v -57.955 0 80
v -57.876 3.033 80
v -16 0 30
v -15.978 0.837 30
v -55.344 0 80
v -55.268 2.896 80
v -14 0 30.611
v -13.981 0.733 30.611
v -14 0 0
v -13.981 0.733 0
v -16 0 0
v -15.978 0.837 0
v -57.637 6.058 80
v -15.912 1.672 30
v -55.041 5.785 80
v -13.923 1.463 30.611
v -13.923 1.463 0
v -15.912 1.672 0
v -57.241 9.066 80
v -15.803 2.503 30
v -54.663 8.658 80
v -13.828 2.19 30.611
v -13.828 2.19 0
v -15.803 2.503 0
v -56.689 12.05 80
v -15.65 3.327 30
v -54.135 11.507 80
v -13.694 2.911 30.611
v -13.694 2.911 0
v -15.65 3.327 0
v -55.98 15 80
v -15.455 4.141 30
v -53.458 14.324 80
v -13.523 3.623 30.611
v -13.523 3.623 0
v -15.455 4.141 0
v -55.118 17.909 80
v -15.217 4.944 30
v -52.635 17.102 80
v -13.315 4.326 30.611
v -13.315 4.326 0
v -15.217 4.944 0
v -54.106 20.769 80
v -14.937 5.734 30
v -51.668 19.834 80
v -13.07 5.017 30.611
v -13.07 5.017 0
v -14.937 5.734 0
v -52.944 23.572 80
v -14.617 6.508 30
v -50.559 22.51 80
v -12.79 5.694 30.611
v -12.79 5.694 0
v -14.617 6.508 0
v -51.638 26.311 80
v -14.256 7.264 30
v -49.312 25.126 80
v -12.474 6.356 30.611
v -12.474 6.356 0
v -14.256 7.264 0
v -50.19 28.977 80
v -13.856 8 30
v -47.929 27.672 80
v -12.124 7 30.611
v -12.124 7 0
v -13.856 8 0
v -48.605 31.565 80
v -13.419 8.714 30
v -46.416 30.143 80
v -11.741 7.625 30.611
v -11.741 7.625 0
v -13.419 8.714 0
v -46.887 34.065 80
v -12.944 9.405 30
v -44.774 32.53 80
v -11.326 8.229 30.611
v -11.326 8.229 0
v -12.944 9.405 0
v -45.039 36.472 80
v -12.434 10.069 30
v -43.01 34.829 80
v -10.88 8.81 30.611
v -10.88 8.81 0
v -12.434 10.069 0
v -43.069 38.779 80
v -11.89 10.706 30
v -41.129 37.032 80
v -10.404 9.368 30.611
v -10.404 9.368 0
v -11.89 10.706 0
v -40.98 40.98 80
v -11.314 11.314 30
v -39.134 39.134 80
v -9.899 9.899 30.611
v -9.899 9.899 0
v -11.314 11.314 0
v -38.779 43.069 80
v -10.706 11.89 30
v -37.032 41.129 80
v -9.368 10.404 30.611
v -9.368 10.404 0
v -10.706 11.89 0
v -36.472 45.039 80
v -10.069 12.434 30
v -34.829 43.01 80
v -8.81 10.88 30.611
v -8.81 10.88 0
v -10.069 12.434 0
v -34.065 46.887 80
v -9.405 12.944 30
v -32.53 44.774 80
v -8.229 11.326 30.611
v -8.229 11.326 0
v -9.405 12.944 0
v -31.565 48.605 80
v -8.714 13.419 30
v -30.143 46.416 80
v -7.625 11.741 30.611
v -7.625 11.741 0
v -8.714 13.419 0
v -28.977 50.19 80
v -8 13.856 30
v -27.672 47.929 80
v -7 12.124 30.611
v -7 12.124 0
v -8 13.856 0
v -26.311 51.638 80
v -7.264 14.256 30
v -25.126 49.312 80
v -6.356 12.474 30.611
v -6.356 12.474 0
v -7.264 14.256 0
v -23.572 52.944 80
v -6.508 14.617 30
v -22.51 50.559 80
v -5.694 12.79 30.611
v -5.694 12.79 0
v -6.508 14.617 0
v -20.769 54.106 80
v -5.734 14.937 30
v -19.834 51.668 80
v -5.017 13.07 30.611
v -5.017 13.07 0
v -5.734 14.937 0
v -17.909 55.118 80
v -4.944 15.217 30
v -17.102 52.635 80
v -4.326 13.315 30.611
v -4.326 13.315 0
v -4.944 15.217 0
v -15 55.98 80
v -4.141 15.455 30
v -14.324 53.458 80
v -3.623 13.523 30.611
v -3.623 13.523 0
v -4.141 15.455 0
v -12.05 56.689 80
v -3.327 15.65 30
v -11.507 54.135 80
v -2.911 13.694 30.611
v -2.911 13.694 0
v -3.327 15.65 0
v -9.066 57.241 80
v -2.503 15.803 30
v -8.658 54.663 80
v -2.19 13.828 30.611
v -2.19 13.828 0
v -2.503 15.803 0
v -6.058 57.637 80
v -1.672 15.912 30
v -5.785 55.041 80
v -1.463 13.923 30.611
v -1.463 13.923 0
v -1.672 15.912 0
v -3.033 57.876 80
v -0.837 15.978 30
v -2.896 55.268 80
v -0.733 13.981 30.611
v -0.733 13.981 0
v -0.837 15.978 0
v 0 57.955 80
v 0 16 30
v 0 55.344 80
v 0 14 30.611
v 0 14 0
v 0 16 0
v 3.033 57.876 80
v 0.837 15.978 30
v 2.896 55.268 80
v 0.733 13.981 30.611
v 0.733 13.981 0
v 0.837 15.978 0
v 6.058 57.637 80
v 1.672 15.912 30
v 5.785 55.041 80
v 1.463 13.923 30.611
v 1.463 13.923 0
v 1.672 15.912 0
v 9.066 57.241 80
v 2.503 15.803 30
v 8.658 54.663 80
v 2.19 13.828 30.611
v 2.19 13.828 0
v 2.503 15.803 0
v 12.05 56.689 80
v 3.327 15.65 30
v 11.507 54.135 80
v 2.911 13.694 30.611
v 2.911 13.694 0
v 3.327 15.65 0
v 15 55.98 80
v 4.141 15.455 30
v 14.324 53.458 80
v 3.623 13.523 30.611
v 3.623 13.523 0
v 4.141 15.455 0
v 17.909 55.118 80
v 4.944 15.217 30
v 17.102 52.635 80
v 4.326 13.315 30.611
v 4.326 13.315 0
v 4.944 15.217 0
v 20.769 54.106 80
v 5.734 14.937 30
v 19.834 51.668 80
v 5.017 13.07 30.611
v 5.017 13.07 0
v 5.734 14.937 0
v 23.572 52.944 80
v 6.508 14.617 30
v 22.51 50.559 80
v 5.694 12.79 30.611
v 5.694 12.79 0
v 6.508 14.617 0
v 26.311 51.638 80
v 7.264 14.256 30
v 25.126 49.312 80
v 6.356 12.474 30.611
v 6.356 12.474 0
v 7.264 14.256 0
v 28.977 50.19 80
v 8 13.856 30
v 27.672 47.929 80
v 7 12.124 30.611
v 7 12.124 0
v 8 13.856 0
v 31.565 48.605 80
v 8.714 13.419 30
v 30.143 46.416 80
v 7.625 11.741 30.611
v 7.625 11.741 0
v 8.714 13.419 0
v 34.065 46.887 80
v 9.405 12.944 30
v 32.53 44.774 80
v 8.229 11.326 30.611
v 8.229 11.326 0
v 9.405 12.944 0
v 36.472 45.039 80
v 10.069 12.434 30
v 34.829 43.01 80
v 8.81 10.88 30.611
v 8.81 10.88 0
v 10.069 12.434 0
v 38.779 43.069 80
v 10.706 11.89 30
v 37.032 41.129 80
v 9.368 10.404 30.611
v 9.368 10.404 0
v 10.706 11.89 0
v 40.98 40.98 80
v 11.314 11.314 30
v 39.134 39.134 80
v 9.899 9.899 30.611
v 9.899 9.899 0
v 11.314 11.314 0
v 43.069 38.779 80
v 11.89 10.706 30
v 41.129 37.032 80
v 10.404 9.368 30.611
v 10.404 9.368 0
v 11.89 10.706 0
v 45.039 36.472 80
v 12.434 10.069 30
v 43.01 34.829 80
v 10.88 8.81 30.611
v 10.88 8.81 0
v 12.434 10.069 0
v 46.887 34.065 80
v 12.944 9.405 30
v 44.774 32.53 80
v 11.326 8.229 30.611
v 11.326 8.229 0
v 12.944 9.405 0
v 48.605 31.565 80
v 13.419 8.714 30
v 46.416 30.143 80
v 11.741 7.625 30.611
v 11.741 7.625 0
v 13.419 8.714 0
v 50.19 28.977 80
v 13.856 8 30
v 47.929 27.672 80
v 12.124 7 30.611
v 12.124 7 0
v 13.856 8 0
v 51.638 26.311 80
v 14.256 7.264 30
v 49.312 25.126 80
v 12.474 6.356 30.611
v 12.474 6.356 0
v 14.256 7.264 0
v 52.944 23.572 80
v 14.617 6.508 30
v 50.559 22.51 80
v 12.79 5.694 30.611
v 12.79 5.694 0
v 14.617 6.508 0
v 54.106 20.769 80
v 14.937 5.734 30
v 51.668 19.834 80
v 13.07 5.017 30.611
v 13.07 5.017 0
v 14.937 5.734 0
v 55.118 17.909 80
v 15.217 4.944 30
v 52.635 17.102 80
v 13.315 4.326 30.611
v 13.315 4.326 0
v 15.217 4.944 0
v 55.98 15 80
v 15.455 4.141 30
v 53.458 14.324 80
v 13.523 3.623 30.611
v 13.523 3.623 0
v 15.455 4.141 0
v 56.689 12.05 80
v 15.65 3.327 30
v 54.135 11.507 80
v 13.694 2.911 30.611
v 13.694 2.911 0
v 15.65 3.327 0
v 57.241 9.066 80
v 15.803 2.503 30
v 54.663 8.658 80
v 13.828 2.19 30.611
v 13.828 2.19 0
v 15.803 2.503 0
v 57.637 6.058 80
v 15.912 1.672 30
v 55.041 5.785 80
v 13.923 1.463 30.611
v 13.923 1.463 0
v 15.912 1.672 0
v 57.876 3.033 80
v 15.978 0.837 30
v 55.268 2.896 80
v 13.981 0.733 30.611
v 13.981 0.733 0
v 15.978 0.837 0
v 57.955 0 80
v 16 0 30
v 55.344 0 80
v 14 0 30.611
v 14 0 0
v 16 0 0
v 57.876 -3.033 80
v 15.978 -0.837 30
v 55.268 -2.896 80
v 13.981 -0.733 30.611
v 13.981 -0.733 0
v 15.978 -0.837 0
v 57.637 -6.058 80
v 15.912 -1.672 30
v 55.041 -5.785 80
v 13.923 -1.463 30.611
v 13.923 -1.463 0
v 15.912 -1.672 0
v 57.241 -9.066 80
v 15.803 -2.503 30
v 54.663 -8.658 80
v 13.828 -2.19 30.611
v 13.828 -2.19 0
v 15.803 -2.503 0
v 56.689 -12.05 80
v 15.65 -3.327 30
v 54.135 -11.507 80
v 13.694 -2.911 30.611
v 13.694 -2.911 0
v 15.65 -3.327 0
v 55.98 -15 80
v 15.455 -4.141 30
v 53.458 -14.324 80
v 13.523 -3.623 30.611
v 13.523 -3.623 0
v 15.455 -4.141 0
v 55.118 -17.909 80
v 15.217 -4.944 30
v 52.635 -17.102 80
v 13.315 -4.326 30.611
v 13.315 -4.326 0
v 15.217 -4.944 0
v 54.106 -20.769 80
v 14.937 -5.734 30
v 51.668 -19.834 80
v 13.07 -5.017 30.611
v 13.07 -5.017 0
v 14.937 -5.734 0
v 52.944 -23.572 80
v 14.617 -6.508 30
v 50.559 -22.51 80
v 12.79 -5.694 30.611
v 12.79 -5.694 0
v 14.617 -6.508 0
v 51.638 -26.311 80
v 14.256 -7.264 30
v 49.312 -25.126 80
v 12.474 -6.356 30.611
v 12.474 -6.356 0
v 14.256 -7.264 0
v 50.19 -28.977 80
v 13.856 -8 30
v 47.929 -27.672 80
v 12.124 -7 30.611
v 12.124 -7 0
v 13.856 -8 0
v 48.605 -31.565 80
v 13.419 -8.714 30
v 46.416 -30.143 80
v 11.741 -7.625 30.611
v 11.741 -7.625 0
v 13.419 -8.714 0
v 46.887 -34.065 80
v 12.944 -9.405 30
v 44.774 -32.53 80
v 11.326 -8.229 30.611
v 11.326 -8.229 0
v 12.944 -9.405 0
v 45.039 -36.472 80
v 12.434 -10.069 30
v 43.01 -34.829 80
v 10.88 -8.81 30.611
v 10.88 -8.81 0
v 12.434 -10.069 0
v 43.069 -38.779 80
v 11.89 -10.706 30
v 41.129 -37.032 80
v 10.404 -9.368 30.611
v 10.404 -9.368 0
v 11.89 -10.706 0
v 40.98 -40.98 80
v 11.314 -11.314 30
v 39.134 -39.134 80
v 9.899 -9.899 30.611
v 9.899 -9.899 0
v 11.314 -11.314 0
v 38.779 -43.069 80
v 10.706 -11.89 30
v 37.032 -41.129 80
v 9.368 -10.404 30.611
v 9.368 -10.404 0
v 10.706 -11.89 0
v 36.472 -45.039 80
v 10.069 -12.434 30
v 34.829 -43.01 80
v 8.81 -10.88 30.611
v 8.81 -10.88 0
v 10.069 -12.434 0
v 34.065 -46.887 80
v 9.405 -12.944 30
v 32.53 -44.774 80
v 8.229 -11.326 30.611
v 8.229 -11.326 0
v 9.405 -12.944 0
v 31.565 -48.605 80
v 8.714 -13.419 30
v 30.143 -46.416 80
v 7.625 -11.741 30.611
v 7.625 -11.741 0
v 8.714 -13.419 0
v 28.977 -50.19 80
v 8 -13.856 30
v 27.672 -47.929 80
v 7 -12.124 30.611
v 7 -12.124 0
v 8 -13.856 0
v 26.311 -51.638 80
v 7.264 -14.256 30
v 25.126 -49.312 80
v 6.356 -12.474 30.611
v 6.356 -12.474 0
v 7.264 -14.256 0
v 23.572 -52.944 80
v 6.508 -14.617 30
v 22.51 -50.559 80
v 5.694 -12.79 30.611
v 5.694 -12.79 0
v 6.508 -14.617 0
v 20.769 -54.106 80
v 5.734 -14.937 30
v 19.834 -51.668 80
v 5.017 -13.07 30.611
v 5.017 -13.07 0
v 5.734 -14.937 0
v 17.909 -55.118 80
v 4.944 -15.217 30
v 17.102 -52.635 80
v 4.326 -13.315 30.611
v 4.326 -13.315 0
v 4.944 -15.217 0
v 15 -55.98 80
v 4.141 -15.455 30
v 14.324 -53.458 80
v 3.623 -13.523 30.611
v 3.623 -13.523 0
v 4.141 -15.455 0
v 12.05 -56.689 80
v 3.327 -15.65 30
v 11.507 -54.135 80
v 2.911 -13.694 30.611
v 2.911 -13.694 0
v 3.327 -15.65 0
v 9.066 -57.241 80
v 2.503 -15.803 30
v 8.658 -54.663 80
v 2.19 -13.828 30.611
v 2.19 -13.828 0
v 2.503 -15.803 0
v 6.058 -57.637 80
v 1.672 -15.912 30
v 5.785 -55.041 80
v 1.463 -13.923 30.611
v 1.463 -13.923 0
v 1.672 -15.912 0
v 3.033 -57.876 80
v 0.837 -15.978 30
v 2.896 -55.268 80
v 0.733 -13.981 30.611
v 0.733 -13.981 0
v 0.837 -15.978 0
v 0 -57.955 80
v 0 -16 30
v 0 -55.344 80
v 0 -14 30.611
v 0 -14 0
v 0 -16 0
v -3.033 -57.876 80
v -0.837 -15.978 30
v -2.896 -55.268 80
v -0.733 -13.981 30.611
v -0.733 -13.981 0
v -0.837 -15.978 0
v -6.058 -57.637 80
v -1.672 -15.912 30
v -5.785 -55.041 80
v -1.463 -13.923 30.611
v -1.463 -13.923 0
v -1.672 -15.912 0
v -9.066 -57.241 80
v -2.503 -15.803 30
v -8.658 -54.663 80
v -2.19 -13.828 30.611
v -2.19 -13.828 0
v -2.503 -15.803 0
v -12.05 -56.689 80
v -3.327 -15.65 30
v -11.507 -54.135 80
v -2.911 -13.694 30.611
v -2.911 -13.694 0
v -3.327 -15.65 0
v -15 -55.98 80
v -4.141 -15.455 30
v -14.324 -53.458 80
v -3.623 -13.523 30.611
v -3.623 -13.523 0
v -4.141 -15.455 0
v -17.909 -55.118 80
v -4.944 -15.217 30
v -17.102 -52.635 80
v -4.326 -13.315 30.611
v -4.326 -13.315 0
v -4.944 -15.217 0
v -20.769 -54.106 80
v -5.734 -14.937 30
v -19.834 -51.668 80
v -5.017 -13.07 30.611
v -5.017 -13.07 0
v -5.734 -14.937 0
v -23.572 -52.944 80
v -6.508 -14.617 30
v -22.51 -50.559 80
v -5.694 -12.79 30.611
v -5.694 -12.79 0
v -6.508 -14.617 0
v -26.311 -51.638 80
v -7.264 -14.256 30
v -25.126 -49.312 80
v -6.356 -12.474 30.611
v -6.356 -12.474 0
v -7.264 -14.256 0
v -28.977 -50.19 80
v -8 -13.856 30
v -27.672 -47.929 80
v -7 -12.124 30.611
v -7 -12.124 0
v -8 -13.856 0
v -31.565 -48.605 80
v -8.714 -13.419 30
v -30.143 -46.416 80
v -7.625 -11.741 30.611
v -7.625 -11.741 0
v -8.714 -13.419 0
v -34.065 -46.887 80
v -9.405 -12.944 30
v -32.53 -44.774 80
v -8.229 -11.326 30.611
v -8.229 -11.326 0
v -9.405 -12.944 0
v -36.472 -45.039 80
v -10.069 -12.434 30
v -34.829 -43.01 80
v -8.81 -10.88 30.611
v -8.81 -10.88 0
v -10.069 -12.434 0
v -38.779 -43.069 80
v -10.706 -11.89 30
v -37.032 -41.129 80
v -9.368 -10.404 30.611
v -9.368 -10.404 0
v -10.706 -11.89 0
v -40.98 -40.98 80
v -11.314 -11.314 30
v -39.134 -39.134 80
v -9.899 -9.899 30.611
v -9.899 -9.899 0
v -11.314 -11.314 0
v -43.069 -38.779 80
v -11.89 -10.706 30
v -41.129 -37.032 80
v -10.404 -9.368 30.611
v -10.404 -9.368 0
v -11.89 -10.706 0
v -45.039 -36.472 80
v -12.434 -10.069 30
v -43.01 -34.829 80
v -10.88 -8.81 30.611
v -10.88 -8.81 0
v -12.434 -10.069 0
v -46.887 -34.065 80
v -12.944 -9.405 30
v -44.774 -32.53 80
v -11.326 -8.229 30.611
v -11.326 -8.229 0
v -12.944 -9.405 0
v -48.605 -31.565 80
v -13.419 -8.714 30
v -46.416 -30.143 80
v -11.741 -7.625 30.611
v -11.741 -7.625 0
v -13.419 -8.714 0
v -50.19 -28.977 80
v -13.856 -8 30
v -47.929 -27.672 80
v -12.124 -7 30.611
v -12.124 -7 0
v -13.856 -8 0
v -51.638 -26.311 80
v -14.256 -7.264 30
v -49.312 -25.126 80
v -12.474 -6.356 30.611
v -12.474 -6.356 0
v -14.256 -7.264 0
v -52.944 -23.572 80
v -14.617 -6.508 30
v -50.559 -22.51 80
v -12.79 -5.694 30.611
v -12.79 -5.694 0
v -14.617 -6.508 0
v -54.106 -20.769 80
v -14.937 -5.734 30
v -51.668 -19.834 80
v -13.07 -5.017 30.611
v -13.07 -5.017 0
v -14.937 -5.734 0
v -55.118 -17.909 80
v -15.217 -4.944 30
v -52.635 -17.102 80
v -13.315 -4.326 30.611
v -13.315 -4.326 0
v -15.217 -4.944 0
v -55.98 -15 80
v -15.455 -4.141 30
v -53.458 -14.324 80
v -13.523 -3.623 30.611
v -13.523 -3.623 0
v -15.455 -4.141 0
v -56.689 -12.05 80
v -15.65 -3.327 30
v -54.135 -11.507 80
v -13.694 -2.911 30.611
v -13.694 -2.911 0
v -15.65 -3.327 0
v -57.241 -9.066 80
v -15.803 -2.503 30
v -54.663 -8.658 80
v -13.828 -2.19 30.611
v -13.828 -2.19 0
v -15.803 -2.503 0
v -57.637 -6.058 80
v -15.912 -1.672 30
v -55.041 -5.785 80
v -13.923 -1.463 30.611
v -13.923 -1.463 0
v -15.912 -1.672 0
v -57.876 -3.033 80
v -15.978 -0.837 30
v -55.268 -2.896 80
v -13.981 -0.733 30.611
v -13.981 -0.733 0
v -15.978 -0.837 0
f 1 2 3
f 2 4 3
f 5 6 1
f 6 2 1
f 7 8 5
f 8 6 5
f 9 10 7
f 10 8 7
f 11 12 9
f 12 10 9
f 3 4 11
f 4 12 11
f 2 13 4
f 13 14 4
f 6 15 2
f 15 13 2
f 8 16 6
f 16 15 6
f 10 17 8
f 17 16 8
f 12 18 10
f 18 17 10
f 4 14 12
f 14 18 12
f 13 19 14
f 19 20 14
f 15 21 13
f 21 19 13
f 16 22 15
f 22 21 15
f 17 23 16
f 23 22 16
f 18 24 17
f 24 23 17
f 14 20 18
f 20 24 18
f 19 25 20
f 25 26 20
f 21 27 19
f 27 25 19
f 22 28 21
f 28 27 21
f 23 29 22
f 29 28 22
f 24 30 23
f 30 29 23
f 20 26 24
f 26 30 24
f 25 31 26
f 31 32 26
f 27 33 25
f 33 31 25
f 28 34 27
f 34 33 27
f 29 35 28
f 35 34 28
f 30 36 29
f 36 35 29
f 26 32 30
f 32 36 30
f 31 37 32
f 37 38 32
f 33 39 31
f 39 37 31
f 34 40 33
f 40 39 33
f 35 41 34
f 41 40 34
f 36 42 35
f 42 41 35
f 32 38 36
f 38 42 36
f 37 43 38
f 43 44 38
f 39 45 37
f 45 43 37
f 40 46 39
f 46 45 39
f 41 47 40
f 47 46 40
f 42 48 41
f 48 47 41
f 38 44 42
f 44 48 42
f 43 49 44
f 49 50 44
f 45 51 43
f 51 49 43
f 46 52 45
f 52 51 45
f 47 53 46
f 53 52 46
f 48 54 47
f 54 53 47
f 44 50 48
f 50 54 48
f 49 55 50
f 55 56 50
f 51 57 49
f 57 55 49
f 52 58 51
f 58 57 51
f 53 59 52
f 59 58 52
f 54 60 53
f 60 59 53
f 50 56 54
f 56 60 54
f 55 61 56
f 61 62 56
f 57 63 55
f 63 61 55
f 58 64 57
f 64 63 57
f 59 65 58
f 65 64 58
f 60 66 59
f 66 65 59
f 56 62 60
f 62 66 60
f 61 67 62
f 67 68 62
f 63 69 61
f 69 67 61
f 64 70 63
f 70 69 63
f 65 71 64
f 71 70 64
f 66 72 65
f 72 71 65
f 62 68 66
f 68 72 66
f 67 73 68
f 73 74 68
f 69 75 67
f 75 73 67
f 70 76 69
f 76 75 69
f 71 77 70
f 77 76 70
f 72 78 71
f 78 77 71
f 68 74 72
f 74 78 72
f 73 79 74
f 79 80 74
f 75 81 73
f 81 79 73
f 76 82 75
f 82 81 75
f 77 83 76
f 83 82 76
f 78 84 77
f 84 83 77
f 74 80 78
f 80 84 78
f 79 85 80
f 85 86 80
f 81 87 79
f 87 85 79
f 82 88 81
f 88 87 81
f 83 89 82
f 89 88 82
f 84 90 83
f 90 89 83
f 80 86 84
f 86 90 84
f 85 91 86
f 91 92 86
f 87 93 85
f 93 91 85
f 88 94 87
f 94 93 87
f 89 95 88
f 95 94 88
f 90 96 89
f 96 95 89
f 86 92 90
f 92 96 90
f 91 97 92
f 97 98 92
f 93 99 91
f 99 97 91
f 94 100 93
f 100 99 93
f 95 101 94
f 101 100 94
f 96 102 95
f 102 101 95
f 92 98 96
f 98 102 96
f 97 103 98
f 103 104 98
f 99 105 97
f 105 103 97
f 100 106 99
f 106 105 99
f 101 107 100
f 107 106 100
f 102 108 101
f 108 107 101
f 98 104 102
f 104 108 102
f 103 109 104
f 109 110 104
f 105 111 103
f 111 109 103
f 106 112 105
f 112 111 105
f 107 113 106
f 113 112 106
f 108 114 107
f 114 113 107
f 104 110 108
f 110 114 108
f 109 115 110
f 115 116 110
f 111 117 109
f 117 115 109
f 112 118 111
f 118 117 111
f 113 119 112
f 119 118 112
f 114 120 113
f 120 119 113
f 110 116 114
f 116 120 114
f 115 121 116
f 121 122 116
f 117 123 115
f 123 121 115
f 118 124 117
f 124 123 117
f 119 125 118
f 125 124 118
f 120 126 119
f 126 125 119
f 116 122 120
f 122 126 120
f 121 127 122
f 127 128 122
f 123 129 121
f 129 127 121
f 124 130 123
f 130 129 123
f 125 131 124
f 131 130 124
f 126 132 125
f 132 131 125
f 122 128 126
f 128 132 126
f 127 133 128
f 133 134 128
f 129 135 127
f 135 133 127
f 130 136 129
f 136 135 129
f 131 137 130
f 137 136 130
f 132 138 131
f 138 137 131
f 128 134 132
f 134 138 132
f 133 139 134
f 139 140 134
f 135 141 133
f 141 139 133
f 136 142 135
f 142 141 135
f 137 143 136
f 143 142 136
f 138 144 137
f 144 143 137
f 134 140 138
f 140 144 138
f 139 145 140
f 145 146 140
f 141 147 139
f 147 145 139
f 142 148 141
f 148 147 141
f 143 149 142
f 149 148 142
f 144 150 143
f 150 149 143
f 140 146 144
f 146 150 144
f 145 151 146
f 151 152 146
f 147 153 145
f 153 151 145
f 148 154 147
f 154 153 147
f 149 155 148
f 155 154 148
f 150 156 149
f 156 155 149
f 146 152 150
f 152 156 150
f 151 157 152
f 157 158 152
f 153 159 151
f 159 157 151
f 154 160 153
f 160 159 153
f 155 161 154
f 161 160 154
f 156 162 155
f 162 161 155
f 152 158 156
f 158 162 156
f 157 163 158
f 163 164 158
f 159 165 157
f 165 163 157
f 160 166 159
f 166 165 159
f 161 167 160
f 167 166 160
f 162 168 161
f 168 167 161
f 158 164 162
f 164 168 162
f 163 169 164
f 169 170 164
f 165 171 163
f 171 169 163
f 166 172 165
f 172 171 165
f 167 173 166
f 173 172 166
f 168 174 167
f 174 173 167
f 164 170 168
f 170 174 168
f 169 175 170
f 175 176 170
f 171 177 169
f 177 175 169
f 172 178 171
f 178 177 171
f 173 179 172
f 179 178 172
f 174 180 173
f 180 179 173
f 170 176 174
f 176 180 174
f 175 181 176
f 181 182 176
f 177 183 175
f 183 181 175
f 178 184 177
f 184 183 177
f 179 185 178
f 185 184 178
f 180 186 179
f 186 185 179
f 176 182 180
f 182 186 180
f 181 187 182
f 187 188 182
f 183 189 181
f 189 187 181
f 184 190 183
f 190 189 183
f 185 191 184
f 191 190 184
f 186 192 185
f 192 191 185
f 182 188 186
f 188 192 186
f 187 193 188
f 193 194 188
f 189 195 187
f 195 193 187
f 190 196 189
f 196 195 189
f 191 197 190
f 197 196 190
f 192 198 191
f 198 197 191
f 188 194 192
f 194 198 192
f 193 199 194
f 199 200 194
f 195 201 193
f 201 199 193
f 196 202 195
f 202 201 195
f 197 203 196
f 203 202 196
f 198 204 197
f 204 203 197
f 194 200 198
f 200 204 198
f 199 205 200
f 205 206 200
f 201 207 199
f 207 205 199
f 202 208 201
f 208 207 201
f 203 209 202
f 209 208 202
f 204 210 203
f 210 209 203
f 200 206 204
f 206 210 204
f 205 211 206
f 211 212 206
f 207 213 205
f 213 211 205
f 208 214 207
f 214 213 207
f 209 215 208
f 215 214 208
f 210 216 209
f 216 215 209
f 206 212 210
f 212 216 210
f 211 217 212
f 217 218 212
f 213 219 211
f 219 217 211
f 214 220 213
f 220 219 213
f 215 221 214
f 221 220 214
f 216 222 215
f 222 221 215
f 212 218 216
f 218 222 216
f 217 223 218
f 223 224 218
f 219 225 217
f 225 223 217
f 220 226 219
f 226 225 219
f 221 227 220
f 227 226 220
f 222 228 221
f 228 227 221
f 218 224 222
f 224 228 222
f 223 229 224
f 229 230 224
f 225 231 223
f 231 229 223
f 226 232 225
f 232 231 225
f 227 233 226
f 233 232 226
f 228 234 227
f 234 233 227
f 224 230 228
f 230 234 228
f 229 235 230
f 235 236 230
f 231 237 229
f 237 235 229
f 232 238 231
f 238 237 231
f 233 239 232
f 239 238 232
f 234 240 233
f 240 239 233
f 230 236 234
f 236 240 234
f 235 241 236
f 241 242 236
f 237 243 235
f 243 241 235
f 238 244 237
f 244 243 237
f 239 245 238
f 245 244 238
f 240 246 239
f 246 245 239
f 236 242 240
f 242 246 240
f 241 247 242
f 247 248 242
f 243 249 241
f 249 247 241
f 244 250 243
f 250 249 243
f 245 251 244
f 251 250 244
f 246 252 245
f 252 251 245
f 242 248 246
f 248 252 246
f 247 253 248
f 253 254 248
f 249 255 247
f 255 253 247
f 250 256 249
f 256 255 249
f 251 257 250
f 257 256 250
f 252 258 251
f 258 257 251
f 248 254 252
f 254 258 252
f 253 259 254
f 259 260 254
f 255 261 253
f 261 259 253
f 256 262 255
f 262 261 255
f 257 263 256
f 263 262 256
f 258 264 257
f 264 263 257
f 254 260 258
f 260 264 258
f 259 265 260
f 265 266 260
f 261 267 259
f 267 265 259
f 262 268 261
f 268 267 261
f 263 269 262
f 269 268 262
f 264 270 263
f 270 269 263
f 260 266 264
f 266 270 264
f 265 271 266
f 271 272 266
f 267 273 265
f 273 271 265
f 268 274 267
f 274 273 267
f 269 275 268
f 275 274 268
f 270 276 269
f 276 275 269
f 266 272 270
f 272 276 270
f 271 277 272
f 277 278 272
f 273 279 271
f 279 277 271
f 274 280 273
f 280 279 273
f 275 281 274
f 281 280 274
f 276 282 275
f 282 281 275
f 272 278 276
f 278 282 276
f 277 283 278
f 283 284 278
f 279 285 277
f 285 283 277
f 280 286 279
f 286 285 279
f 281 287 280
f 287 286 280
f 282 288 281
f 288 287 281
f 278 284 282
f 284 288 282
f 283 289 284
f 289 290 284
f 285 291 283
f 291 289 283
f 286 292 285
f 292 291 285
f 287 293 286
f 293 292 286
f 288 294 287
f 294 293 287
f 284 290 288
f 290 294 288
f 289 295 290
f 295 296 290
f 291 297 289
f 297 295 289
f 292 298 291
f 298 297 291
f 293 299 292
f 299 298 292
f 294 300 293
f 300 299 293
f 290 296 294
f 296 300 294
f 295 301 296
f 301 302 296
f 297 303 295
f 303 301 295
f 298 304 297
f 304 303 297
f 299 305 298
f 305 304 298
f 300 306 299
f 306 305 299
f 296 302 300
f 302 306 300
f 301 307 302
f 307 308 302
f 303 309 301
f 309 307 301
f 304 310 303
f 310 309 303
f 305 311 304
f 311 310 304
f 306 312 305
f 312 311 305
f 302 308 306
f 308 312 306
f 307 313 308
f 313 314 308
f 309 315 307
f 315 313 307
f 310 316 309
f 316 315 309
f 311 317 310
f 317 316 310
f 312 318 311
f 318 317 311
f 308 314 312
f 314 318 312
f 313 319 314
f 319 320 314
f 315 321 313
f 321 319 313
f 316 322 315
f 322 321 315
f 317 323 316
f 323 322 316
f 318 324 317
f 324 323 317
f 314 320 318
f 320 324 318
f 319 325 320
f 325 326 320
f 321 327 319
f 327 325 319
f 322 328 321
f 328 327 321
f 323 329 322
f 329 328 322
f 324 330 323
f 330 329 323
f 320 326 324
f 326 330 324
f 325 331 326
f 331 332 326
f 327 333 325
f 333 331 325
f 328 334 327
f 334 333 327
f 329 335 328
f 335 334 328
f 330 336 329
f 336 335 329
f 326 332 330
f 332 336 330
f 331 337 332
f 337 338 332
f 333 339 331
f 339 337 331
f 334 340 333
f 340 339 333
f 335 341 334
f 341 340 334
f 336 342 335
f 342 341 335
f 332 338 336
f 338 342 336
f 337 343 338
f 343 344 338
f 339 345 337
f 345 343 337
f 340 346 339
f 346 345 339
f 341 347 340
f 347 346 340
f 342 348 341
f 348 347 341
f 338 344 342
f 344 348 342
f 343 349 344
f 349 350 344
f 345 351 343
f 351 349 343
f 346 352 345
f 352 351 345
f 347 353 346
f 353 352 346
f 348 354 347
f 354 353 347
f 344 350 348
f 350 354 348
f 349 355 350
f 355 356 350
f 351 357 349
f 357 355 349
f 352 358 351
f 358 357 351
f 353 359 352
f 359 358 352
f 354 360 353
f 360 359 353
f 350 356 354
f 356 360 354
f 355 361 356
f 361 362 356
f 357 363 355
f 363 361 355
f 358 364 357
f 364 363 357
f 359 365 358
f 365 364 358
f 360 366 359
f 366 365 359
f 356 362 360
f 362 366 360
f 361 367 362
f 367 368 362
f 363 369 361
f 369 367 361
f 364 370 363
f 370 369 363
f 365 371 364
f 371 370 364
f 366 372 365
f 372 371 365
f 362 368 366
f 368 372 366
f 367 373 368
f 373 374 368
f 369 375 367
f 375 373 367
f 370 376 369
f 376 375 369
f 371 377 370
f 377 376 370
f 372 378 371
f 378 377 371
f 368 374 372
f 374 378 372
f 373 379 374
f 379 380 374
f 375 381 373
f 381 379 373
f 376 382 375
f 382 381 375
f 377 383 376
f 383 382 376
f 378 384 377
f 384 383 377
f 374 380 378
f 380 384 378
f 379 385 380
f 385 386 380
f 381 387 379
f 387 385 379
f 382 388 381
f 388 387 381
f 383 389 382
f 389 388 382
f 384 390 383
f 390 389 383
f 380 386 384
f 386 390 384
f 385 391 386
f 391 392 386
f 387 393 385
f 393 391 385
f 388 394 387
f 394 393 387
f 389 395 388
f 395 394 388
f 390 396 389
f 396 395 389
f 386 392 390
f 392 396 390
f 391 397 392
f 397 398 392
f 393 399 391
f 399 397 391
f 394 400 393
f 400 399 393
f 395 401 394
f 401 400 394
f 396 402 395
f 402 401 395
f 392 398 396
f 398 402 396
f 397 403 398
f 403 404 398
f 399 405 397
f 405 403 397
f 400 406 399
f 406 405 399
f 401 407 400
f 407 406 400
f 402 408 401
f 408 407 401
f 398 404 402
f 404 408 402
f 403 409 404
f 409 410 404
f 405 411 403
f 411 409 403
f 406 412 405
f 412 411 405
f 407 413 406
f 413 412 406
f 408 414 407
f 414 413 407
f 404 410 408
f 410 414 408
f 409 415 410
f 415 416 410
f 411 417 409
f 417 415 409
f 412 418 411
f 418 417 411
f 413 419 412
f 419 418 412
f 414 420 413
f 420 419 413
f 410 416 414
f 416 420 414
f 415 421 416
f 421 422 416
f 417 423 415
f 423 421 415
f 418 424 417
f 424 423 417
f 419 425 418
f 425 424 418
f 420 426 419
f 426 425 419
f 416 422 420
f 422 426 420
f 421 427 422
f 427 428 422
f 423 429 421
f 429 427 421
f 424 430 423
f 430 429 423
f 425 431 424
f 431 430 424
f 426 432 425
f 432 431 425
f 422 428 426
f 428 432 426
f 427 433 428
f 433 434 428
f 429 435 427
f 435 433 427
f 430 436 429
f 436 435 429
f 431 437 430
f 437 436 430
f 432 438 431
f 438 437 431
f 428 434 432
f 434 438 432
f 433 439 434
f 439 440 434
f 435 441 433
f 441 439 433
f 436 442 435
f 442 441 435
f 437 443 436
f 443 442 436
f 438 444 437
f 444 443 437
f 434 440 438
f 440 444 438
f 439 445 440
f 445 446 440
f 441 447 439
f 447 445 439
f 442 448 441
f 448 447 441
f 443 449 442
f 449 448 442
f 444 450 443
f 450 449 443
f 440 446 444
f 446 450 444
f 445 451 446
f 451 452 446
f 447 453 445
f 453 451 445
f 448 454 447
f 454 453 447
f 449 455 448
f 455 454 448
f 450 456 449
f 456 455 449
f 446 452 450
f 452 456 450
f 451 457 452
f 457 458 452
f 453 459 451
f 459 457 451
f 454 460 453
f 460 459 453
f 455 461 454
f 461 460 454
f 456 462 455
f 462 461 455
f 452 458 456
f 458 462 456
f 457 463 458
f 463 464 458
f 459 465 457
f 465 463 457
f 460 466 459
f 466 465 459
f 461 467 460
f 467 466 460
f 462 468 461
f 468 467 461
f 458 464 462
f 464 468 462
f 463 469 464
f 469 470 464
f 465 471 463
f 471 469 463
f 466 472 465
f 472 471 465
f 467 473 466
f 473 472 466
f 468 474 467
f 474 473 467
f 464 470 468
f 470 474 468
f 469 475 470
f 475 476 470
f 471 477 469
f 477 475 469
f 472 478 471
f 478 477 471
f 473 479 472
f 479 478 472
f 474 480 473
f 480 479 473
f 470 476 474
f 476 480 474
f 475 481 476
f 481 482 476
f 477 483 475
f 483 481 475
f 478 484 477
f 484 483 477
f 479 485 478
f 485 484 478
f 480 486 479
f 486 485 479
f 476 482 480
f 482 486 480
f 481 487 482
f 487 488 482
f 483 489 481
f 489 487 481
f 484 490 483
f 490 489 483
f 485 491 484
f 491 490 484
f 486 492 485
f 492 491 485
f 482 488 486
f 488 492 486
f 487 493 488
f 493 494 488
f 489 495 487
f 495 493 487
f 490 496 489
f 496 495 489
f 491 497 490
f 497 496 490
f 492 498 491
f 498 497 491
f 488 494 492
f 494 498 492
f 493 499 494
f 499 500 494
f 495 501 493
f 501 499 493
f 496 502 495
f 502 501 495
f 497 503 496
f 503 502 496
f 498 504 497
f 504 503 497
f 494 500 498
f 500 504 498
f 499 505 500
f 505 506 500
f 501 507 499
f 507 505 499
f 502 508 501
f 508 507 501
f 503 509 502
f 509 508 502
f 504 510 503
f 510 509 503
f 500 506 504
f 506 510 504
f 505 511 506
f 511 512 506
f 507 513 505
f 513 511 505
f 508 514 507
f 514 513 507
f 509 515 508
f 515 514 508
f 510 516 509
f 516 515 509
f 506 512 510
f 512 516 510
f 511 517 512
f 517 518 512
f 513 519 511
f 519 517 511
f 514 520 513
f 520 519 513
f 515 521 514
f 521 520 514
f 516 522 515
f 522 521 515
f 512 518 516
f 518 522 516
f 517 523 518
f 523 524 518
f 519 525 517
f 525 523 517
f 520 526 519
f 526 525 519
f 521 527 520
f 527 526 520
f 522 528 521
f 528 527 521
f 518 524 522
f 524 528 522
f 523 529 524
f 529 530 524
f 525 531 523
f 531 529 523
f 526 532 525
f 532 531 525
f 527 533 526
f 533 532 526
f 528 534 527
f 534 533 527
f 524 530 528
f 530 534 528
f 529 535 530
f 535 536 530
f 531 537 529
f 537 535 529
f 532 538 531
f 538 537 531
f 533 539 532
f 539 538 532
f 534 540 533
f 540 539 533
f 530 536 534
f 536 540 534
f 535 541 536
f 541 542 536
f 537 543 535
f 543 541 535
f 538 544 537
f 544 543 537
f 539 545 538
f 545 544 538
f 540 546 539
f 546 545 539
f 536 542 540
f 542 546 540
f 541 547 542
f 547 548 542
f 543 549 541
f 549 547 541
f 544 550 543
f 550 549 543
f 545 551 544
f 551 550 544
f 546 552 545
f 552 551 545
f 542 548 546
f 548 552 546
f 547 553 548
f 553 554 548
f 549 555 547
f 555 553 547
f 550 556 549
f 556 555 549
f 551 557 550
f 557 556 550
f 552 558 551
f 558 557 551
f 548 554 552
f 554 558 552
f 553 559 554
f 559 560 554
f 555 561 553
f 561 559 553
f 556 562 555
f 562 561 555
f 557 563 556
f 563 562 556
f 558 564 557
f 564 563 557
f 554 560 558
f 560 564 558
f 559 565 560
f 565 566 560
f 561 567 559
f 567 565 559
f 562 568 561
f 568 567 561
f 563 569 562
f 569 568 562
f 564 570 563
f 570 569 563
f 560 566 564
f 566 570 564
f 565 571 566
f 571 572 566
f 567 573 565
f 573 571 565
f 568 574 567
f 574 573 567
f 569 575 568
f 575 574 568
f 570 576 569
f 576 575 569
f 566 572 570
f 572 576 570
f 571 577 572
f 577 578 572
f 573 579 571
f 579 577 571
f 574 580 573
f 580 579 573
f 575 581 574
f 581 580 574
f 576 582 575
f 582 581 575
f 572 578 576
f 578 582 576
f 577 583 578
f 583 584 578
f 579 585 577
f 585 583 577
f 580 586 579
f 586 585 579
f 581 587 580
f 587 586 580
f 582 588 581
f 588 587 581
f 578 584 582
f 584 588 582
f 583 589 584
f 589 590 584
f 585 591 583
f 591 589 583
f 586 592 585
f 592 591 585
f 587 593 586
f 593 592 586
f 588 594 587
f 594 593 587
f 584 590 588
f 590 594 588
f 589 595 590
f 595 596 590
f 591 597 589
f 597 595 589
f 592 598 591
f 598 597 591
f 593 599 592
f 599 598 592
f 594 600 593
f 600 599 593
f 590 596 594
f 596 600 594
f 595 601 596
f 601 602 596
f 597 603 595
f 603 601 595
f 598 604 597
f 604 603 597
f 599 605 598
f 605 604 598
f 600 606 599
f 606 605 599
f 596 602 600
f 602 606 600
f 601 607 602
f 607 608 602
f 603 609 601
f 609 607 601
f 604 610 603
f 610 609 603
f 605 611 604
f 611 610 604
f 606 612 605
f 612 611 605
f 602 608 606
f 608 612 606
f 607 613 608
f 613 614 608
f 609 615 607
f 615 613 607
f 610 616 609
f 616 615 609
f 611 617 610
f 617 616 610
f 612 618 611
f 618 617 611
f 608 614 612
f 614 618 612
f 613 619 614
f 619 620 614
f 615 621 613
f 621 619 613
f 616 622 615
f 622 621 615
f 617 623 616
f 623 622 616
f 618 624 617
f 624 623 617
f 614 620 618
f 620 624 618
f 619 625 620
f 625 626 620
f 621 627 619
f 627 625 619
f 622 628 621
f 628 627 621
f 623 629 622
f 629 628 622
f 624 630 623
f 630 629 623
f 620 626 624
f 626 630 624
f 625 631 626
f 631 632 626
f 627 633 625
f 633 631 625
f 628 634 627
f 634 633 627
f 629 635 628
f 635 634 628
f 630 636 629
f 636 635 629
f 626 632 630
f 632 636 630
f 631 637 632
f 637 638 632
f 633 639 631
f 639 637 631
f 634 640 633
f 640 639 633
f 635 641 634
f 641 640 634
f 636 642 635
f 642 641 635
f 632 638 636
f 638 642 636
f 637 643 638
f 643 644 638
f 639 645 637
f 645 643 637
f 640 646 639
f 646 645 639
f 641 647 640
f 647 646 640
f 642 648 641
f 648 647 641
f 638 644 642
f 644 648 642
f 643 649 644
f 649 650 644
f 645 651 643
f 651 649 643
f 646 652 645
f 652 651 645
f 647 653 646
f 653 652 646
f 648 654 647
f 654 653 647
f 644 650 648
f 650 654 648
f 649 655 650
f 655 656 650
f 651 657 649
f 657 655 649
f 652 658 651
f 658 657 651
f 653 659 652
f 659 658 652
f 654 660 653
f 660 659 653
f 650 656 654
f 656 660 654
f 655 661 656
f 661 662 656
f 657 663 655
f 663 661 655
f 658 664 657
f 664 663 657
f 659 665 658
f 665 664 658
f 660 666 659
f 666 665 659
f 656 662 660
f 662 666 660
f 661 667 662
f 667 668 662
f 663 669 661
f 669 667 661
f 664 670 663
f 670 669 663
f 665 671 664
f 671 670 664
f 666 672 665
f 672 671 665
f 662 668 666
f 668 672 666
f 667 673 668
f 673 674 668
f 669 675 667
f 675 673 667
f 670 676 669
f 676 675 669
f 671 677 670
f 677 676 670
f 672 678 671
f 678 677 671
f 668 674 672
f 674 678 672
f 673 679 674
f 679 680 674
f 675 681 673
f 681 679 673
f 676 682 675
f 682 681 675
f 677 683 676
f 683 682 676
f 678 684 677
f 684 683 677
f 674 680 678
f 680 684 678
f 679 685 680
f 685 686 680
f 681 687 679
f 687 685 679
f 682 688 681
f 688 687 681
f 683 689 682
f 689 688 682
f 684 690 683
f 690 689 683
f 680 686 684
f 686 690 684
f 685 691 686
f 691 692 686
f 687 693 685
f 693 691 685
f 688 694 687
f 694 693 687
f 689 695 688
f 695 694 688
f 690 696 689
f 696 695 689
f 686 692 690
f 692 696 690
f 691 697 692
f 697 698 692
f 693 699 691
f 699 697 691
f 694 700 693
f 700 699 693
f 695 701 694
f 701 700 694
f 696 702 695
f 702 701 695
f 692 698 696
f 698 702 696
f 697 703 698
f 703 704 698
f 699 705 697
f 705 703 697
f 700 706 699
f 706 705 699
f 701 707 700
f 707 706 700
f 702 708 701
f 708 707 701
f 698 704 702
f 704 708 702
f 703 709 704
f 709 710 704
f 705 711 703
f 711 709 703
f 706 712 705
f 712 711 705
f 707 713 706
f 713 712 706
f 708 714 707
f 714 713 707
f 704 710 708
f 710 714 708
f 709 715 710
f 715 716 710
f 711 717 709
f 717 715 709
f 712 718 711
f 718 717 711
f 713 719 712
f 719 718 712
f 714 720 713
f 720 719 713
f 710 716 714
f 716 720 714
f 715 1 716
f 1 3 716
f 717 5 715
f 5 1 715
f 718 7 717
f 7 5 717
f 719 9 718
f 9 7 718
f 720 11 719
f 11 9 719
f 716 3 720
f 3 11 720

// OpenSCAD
hc=50; // cone surpluss height
ac=50; // cone angle from x-axis / ccw
xc=hc/tan(ac); //cone width

dt=32; // tube outer diameter
lt=30; // tube length

tw=2; // wall thickness
xw=tw/sin(ac); // cone wall x-dir thickness

echo(str("Cone Diameter = ",dt+2*xc));
echo(str("Funnel Height = ",lt+hc));

rotate_extrude(angle = 360, convexity = 2, $fn = 120)
{
    polygon([
        [dt/2-tw   ,       0],
        [dt/2      ,       0],
        [dt/2      ,lt      ],
        [dt/2+xc   ,lt   +hc],
        [dt/2+xc-xw,lt   +hc],
        [dt/2-tw   ,lt+xw-tw]],
        paths=[[0,1,2,3,4,5]]);
};
